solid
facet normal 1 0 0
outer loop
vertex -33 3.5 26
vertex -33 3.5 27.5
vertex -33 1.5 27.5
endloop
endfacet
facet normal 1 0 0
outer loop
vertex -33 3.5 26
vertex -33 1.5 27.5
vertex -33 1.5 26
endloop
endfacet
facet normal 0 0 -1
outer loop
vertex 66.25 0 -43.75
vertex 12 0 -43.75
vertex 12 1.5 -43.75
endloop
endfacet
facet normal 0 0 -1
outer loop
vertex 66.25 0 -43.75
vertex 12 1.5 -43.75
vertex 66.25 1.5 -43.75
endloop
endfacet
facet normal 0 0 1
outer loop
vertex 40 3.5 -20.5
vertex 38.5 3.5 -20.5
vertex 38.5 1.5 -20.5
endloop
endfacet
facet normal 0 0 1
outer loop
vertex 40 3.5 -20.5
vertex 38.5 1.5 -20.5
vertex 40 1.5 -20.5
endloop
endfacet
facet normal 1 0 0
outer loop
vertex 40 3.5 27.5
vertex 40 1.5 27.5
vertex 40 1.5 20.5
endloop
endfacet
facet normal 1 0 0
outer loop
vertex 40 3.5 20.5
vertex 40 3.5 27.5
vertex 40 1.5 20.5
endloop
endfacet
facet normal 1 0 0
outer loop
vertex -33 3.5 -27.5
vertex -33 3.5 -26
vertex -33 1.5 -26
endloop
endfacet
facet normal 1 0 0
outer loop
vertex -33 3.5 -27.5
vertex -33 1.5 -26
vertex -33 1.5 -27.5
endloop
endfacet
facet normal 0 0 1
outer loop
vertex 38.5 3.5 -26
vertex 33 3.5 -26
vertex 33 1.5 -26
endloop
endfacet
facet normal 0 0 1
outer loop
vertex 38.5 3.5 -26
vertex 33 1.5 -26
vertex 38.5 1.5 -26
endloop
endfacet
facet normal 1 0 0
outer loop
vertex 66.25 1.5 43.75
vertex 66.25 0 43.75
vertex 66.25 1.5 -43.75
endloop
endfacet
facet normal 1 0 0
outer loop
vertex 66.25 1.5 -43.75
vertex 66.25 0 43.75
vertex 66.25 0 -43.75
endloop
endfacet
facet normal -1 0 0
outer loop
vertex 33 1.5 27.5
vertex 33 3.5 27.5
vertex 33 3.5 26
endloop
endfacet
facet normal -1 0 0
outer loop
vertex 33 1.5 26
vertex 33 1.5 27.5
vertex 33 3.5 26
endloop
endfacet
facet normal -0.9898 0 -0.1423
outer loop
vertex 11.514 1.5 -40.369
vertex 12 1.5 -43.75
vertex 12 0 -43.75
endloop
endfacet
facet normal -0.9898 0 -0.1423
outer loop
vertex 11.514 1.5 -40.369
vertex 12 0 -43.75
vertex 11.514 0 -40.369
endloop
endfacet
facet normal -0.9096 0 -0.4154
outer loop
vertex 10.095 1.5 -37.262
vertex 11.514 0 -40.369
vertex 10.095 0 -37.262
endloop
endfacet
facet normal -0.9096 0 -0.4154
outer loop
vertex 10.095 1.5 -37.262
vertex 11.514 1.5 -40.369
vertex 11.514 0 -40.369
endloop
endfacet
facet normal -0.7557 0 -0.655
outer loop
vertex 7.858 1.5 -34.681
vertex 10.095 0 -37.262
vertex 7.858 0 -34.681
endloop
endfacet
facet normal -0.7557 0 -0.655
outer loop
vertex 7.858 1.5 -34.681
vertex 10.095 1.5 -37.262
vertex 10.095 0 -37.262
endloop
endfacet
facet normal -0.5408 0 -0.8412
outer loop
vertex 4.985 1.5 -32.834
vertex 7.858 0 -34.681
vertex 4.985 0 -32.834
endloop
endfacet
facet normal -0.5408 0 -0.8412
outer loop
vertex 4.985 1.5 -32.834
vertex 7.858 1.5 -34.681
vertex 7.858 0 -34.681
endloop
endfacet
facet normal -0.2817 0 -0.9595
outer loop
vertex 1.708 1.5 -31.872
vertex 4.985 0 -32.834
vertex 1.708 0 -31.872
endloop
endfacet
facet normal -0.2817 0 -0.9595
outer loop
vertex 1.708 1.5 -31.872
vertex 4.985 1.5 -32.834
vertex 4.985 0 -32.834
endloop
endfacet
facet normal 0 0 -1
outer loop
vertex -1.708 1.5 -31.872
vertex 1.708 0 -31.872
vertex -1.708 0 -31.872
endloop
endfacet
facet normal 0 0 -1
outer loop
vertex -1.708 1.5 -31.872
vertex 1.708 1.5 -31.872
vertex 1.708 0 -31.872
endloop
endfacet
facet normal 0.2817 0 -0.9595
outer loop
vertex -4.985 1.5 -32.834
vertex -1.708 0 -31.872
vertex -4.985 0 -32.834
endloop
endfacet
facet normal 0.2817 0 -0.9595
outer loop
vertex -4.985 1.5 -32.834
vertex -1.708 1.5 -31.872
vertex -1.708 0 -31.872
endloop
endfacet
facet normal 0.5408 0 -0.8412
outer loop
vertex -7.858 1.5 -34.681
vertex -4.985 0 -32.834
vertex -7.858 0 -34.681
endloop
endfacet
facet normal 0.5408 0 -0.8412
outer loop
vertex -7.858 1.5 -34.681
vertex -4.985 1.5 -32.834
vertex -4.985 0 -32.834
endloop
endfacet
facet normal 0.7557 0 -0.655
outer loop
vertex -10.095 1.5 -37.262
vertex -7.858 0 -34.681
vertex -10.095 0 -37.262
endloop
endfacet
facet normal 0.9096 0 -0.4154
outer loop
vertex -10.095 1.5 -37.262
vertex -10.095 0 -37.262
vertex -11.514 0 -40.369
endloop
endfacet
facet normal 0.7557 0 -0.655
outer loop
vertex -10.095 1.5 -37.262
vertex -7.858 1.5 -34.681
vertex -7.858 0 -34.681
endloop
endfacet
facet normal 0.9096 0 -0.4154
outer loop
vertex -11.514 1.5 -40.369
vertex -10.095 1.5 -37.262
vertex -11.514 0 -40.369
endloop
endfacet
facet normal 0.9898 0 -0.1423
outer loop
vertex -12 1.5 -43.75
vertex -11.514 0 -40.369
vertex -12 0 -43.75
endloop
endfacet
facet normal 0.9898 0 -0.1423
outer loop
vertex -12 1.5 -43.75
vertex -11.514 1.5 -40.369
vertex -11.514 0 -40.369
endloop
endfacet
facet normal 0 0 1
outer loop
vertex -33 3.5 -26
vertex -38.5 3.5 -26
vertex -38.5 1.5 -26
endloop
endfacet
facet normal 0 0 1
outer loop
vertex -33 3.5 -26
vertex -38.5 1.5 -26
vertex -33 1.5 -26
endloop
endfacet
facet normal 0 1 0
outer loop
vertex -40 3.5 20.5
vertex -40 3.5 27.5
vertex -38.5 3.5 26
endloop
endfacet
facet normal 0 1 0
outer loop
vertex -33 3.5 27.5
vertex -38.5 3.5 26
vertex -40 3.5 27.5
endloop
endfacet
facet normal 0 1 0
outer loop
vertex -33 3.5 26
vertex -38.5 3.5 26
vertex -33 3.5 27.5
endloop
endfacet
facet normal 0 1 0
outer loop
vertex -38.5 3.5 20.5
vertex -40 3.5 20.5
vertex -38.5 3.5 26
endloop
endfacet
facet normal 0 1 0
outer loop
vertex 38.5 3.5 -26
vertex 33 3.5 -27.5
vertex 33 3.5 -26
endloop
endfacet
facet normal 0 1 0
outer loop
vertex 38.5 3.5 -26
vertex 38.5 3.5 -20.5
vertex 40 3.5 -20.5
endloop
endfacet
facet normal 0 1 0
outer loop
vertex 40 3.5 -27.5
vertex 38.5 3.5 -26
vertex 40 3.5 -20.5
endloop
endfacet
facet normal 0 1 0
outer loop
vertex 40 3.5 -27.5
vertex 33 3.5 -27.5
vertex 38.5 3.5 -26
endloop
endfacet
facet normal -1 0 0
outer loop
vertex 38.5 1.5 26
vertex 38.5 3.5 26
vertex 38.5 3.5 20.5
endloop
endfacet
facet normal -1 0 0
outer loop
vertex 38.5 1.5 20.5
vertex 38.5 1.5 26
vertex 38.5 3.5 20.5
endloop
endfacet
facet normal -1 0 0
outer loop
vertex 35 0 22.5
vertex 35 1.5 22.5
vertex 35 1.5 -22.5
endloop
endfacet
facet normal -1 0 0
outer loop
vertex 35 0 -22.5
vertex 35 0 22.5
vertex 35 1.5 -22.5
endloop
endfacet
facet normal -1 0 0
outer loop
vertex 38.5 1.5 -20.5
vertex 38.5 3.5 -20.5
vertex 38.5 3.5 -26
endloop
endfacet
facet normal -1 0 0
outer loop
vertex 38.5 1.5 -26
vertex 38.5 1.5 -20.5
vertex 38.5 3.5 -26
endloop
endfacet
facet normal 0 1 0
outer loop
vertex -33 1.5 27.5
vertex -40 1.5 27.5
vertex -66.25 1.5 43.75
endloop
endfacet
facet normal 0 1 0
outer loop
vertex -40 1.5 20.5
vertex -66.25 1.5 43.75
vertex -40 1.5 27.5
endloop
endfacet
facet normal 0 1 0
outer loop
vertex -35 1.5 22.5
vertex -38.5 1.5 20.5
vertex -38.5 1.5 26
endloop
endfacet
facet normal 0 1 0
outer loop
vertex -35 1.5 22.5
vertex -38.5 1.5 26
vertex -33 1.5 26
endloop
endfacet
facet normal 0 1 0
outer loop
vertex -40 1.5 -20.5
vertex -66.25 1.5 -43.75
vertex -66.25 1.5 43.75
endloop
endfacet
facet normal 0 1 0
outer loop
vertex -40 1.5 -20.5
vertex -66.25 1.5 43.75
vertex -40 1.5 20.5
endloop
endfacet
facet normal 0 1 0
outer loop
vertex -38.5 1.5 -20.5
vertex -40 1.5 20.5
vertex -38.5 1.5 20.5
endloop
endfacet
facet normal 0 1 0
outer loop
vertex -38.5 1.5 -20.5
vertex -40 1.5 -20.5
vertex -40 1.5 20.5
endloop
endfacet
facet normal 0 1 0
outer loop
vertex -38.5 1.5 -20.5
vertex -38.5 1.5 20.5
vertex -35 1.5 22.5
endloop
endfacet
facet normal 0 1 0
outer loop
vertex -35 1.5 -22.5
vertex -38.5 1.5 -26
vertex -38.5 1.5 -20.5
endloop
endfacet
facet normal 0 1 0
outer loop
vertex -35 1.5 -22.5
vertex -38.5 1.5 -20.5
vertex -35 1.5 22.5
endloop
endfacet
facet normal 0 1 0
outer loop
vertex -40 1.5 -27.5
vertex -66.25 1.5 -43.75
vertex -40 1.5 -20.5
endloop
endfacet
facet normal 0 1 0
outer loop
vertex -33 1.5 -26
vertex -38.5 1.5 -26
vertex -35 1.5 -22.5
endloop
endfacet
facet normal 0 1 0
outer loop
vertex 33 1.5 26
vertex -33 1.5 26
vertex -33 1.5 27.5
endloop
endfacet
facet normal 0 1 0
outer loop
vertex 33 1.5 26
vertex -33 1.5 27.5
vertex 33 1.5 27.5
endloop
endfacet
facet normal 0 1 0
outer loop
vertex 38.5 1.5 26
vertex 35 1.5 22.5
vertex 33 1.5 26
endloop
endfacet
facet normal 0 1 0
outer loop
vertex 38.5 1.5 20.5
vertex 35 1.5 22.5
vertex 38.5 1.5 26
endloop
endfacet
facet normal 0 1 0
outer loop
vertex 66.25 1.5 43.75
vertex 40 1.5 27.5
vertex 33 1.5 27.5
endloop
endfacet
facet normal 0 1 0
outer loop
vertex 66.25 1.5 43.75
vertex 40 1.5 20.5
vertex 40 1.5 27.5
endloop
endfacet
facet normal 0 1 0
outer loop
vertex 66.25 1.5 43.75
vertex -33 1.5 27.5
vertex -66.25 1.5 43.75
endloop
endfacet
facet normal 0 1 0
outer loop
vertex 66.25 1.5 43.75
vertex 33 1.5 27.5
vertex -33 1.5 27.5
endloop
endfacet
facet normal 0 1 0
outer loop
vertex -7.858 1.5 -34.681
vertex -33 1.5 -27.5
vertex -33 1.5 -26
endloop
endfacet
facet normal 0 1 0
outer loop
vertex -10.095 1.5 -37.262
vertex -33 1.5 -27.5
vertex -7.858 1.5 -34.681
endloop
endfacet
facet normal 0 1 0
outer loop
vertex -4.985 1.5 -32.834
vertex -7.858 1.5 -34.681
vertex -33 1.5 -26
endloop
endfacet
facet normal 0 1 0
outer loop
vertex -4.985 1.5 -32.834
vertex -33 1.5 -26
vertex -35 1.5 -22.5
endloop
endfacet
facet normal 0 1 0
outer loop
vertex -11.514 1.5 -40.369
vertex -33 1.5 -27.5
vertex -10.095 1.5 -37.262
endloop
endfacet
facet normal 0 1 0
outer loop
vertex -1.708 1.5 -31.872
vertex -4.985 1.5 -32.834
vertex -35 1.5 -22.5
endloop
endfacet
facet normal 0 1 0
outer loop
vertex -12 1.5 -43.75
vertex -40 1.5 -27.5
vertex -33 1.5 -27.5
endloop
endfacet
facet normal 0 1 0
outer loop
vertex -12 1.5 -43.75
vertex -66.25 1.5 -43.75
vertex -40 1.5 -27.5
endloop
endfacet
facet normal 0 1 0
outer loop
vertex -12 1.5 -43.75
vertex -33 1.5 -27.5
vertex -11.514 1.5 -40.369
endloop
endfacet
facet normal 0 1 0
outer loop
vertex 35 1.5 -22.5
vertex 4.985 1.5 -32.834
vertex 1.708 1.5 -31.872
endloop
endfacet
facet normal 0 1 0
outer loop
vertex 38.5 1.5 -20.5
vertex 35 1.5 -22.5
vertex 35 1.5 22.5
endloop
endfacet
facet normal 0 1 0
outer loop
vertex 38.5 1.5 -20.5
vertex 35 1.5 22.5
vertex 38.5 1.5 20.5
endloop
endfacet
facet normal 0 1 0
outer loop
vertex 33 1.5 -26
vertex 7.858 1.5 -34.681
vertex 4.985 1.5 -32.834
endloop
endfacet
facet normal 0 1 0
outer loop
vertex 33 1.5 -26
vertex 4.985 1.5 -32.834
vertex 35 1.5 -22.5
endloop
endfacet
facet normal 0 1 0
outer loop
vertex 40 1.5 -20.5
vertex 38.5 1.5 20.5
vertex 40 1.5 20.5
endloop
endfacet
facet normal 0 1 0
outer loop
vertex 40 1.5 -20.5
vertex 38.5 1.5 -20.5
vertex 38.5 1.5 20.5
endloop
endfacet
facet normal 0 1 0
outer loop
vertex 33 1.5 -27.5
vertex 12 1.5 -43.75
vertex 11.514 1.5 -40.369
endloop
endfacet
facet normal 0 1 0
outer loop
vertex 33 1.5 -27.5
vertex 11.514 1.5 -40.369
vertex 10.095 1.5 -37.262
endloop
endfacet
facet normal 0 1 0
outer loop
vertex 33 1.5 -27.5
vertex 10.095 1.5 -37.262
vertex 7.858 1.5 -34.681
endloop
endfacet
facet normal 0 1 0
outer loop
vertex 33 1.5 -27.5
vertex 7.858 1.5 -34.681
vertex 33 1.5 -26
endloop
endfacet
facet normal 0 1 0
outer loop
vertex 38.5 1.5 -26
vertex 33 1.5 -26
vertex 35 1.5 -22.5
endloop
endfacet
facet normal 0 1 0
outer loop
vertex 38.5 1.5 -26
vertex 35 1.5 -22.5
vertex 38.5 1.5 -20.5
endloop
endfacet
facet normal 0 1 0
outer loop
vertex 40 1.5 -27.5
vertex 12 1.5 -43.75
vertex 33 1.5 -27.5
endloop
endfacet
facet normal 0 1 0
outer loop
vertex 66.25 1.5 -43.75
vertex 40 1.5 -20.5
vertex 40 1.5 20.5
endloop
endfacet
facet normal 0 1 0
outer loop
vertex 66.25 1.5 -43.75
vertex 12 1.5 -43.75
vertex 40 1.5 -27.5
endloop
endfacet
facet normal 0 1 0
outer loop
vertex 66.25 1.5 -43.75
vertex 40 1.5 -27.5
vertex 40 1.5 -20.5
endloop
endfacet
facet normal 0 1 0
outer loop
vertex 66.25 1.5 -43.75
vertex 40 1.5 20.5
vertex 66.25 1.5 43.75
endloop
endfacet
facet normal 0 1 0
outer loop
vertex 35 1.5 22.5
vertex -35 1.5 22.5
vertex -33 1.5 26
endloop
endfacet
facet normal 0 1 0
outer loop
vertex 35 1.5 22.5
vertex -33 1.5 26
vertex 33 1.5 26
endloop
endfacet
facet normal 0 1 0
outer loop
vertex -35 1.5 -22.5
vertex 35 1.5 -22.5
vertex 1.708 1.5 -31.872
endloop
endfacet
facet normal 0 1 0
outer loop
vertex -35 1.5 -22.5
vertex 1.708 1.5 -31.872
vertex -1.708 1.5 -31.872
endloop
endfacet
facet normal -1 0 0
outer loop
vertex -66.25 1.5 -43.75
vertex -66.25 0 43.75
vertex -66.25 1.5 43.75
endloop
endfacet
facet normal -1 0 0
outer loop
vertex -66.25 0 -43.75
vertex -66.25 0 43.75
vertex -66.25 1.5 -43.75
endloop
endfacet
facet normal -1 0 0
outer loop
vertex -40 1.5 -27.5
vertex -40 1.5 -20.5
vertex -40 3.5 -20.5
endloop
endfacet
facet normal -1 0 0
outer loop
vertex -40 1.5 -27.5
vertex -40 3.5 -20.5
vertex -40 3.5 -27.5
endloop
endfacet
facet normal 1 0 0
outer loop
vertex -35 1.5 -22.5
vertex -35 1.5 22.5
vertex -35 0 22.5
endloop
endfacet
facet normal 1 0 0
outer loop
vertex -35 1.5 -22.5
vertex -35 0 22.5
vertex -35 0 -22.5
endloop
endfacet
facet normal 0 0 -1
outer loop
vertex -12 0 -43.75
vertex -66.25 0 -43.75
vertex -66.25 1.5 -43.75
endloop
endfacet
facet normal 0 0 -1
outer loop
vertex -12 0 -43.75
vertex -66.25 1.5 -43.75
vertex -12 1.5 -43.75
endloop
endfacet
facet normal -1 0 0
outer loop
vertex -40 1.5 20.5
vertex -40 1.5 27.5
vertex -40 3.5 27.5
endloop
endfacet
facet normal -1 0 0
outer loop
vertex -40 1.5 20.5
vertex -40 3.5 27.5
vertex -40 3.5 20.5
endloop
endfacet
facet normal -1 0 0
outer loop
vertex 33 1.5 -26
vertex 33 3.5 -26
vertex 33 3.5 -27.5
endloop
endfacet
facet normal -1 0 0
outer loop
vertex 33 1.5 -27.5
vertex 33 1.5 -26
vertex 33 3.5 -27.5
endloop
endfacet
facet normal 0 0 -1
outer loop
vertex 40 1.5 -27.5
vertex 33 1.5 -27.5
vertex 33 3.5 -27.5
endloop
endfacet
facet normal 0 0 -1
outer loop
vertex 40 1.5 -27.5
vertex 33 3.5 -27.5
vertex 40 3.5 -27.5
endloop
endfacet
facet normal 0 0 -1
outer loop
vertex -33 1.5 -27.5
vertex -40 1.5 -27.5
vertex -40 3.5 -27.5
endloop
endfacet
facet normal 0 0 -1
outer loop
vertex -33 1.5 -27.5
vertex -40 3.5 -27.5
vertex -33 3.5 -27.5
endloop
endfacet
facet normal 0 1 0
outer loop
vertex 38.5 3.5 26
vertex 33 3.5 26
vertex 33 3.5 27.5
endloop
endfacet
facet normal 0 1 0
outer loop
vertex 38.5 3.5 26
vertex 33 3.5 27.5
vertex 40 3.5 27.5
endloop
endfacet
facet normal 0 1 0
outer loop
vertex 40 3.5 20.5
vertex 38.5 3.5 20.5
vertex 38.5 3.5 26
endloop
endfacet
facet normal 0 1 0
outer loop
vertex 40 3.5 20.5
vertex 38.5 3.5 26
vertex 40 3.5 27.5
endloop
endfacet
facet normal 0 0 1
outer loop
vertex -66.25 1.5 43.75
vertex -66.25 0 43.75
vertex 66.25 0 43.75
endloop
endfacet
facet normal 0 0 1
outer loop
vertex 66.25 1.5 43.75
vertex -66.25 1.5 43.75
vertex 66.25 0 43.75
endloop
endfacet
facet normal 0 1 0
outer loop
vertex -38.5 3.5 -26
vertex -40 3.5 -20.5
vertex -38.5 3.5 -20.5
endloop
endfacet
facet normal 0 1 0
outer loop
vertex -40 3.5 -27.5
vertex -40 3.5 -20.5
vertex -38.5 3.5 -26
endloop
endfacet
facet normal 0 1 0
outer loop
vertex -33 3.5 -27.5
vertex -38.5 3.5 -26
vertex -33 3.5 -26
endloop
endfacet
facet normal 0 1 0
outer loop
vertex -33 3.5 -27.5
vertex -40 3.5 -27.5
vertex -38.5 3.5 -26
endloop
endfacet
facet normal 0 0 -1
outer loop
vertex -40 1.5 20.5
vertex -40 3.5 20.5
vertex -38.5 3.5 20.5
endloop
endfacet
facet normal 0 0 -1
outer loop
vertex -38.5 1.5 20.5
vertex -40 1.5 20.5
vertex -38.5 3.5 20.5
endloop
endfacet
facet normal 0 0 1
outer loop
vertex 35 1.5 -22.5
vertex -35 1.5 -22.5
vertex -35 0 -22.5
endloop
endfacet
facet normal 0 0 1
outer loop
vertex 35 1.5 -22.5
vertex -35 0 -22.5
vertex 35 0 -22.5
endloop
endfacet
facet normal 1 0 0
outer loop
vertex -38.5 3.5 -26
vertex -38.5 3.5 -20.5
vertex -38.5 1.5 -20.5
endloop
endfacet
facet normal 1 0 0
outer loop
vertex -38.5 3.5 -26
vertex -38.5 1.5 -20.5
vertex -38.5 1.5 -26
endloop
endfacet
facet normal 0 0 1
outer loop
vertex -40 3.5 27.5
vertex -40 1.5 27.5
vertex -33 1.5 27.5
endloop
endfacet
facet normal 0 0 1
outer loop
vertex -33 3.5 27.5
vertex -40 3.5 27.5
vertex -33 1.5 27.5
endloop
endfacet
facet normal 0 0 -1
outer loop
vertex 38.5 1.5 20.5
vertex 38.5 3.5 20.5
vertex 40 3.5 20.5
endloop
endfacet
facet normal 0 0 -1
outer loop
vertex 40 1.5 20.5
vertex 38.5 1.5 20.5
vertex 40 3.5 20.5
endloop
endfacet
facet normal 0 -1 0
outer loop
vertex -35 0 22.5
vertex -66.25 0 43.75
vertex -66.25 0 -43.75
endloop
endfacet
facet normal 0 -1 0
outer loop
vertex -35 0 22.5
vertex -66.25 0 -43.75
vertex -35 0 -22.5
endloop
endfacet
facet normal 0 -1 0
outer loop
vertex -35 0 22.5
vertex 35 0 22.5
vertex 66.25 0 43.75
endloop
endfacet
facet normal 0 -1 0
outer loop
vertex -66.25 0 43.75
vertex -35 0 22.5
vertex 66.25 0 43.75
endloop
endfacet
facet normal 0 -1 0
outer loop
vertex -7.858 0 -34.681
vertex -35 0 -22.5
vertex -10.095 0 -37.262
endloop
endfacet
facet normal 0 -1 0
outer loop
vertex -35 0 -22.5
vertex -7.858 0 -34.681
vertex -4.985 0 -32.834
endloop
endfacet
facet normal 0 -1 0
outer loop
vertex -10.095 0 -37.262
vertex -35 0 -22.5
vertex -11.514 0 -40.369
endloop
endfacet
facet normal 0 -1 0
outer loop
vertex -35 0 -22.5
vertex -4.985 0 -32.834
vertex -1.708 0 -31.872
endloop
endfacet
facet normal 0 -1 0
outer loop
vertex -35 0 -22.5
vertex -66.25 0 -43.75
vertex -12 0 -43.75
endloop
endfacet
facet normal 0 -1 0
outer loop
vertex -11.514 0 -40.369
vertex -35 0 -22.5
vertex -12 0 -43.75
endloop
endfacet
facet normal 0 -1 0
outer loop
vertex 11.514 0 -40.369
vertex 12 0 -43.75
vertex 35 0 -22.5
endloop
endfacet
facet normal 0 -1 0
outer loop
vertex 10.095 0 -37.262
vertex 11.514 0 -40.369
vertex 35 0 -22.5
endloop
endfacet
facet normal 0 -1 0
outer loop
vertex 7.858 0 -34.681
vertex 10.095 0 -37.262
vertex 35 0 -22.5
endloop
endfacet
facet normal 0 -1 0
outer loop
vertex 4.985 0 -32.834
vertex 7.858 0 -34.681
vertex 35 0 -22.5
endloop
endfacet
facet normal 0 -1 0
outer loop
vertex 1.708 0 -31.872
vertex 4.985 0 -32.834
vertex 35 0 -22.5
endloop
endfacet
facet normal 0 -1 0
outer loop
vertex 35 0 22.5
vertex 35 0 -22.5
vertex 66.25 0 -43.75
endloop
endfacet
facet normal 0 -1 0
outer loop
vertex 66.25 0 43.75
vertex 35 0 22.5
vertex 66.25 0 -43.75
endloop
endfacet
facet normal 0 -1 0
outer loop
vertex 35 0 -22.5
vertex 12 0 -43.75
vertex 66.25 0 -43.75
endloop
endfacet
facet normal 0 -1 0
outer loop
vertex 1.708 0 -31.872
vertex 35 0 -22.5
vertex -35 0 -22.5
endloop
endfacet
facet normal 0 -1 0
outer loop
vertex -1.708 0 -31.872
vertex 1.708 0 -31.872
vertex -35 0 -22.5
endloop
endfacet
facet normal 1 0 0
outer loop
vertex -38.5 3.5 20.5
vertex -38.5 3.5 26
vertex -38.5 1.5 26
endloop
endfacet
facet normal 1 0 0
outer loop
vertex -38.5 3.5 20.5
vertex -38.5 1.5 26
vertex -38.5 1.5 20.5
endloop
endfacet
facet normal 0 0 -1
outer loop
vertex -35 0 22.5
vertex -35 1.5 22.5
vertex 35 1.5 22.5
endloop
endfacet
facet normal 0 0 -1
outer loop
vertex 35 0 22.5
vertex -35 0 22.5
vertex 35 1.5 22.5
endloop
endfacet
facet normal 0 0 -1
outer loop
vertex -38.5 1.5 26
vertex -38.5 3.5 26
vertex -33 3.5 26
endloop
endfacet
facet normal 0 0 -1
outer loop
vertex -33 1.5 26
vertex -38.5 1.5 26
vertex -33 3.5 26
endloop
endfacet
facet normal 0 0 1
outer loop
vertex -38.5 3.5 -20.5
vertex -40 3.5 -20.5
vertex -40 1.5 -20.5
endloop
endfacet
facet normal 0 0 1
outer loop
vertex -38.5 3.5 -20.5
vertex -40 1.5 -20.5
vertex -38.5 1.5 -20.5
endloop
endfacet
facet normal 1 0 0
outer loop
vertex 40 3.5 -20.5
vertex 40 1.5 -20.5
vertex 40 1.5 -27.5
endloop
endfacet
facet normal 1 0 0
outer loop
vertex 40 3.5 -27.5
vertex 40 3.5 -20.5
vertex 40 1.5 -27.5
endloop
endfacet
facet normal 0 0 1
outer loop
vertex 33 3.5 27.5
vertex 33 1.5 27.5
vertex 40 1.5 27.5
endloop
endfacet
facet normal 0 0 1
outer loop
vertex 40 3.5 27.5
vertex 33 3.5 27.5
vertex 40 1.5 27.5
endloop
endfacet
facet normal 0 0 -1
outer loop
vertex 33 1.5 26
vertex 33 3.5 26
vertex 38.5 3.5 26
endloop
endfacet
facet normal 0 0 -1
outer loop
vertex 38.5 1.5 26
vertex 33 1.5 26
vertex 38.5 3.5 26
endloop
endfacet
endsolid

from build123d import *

# Parameters (mm, degrees)
SKETCH1_W           = 132.5
SKETCH1_H           = 87.5
BOSS_EXTRUDE1_DEPTH = 1.5
SKETCH2_W           = 80
SKETCH2_H           = 55
BOSS_EXTRUDE2_DEPTH = 2
SKETCH3_W           = 77
SKETCH3_H           = 52
CUT_EXTRUDE1_DEPTH  = 2
CUT_EXTRUDE2_REACH  = 3.5
SKETCH4_W           = 70
SKETCH4_H           = 45
SKETCH5_W           = 1.5
SKETCH5_H           = 41
SKETCH5_W_2         = 66
SKETCH5_H_2         = 1.5
CUT_EXTRUDE3_DEPTH  = 2
CUT_EXTRUDE4_DEPTH  = 1.5


with BuildPart() as part:
    # Sketch1 → Boss-Extrude1 (new body)
    with BuildSketch(Plane(origin=(0, 0, 0), x_dir=(1, 0, 0), z_dir=(0, 1, 0))):
        Rectangle(SKETCH1_W, SKETCH1_H)
    extrude(amount=BOSS_EXTRUDE1_DEPTH)

    # Sketch2 → Boss-Extrude2 (add)
    with BuildSketch(Plane(origin=(0, 1.5, 0), x_dir=(1, 0, 0), z_dir=(0, 1, 0))):
        Rectangle(SKETCH2_W, SKETCH2_H)
    extrude(amount=BOSS_EXTRUDE2_DEPTH)

    # Sketch3 → Cut-Extrude1 (cut)
    with BuildSketch(Plane(origin=(0, 3.5, 0), x_dir=(1, 0, 0), z_dir=(0, 1, 0))):
        Rectangle(SKETCH3_W, SKETCH3_H)
    extrude(amount=-CUT_EXTRUDE1_DEPTH, mode=Mode.SUBTRACT)

    # Sketch4 → Cut-Extrude2 (cut, up to next)
    with BuildSketch(Plane(origin=(0, 1.5, 0), x_dir=(1, 0, 0), z_dir=(0, 1, 0)), mode=Mode.PRIVATE) as cut_extrude2_sk1:
        Rectangle(SKETCH4_W, SKETCH4_H)
    cut_extrude2_tool1 = extrude(cut_extrude2_sk1.sketch, amount=-CUT_EXTRUDE2_REACH, mode=Mode.PRIVATE) & part.part
    add(cut_extrude2_tool1.solids().sort_by_distance((0, 1.5, 0))[0], mode=Mode.SUBTRACT)

    # Sketch5 → Cut-Extrude3 (cut)
    with BuildSketch(Plane(origin=(0, 3.5, 0), x_dir=(1, 0, 0), z_dir=(0, 1, 0))):
        with Locations((-39.25, 0)):
            Rectangle(SKETCH5_W, SKETCH5_H)
        with Locations((39.25, 0)):
            Rectangle(SKETCH5_W, SKETCH5_H)
        with Locations((0, 26.75)):
            Rectangle(SKETCH5_W_2, SKETCH5_H_2)
        with Locations((0, -26.75)):
            Rectangle(SKETCH5_W_2, SKETCH5_H_2)
    extrude(amount=-CUT_EXTRUDE3_DEPTH, mode=Mode.SUBTRACT)

    # Sketch6 → Cut-Extrude4 (cut)
    with BuildSketch(Plane(origin=(0, 1.5, 0), x_dir=(1, 0, 0), z_dir=(0, 1, 0))):
        with BuildLine():
            Line((-12, 43.75), (12, 43.75))
            ThreePointArc((12, 43.75), (0, 31.75), (-12, 43.75))
        make_face()
    extrude(amount=-CUT_EXTRUDE4_DEPTH, mode=Mode.SUBTRACT)


solid = part.part
